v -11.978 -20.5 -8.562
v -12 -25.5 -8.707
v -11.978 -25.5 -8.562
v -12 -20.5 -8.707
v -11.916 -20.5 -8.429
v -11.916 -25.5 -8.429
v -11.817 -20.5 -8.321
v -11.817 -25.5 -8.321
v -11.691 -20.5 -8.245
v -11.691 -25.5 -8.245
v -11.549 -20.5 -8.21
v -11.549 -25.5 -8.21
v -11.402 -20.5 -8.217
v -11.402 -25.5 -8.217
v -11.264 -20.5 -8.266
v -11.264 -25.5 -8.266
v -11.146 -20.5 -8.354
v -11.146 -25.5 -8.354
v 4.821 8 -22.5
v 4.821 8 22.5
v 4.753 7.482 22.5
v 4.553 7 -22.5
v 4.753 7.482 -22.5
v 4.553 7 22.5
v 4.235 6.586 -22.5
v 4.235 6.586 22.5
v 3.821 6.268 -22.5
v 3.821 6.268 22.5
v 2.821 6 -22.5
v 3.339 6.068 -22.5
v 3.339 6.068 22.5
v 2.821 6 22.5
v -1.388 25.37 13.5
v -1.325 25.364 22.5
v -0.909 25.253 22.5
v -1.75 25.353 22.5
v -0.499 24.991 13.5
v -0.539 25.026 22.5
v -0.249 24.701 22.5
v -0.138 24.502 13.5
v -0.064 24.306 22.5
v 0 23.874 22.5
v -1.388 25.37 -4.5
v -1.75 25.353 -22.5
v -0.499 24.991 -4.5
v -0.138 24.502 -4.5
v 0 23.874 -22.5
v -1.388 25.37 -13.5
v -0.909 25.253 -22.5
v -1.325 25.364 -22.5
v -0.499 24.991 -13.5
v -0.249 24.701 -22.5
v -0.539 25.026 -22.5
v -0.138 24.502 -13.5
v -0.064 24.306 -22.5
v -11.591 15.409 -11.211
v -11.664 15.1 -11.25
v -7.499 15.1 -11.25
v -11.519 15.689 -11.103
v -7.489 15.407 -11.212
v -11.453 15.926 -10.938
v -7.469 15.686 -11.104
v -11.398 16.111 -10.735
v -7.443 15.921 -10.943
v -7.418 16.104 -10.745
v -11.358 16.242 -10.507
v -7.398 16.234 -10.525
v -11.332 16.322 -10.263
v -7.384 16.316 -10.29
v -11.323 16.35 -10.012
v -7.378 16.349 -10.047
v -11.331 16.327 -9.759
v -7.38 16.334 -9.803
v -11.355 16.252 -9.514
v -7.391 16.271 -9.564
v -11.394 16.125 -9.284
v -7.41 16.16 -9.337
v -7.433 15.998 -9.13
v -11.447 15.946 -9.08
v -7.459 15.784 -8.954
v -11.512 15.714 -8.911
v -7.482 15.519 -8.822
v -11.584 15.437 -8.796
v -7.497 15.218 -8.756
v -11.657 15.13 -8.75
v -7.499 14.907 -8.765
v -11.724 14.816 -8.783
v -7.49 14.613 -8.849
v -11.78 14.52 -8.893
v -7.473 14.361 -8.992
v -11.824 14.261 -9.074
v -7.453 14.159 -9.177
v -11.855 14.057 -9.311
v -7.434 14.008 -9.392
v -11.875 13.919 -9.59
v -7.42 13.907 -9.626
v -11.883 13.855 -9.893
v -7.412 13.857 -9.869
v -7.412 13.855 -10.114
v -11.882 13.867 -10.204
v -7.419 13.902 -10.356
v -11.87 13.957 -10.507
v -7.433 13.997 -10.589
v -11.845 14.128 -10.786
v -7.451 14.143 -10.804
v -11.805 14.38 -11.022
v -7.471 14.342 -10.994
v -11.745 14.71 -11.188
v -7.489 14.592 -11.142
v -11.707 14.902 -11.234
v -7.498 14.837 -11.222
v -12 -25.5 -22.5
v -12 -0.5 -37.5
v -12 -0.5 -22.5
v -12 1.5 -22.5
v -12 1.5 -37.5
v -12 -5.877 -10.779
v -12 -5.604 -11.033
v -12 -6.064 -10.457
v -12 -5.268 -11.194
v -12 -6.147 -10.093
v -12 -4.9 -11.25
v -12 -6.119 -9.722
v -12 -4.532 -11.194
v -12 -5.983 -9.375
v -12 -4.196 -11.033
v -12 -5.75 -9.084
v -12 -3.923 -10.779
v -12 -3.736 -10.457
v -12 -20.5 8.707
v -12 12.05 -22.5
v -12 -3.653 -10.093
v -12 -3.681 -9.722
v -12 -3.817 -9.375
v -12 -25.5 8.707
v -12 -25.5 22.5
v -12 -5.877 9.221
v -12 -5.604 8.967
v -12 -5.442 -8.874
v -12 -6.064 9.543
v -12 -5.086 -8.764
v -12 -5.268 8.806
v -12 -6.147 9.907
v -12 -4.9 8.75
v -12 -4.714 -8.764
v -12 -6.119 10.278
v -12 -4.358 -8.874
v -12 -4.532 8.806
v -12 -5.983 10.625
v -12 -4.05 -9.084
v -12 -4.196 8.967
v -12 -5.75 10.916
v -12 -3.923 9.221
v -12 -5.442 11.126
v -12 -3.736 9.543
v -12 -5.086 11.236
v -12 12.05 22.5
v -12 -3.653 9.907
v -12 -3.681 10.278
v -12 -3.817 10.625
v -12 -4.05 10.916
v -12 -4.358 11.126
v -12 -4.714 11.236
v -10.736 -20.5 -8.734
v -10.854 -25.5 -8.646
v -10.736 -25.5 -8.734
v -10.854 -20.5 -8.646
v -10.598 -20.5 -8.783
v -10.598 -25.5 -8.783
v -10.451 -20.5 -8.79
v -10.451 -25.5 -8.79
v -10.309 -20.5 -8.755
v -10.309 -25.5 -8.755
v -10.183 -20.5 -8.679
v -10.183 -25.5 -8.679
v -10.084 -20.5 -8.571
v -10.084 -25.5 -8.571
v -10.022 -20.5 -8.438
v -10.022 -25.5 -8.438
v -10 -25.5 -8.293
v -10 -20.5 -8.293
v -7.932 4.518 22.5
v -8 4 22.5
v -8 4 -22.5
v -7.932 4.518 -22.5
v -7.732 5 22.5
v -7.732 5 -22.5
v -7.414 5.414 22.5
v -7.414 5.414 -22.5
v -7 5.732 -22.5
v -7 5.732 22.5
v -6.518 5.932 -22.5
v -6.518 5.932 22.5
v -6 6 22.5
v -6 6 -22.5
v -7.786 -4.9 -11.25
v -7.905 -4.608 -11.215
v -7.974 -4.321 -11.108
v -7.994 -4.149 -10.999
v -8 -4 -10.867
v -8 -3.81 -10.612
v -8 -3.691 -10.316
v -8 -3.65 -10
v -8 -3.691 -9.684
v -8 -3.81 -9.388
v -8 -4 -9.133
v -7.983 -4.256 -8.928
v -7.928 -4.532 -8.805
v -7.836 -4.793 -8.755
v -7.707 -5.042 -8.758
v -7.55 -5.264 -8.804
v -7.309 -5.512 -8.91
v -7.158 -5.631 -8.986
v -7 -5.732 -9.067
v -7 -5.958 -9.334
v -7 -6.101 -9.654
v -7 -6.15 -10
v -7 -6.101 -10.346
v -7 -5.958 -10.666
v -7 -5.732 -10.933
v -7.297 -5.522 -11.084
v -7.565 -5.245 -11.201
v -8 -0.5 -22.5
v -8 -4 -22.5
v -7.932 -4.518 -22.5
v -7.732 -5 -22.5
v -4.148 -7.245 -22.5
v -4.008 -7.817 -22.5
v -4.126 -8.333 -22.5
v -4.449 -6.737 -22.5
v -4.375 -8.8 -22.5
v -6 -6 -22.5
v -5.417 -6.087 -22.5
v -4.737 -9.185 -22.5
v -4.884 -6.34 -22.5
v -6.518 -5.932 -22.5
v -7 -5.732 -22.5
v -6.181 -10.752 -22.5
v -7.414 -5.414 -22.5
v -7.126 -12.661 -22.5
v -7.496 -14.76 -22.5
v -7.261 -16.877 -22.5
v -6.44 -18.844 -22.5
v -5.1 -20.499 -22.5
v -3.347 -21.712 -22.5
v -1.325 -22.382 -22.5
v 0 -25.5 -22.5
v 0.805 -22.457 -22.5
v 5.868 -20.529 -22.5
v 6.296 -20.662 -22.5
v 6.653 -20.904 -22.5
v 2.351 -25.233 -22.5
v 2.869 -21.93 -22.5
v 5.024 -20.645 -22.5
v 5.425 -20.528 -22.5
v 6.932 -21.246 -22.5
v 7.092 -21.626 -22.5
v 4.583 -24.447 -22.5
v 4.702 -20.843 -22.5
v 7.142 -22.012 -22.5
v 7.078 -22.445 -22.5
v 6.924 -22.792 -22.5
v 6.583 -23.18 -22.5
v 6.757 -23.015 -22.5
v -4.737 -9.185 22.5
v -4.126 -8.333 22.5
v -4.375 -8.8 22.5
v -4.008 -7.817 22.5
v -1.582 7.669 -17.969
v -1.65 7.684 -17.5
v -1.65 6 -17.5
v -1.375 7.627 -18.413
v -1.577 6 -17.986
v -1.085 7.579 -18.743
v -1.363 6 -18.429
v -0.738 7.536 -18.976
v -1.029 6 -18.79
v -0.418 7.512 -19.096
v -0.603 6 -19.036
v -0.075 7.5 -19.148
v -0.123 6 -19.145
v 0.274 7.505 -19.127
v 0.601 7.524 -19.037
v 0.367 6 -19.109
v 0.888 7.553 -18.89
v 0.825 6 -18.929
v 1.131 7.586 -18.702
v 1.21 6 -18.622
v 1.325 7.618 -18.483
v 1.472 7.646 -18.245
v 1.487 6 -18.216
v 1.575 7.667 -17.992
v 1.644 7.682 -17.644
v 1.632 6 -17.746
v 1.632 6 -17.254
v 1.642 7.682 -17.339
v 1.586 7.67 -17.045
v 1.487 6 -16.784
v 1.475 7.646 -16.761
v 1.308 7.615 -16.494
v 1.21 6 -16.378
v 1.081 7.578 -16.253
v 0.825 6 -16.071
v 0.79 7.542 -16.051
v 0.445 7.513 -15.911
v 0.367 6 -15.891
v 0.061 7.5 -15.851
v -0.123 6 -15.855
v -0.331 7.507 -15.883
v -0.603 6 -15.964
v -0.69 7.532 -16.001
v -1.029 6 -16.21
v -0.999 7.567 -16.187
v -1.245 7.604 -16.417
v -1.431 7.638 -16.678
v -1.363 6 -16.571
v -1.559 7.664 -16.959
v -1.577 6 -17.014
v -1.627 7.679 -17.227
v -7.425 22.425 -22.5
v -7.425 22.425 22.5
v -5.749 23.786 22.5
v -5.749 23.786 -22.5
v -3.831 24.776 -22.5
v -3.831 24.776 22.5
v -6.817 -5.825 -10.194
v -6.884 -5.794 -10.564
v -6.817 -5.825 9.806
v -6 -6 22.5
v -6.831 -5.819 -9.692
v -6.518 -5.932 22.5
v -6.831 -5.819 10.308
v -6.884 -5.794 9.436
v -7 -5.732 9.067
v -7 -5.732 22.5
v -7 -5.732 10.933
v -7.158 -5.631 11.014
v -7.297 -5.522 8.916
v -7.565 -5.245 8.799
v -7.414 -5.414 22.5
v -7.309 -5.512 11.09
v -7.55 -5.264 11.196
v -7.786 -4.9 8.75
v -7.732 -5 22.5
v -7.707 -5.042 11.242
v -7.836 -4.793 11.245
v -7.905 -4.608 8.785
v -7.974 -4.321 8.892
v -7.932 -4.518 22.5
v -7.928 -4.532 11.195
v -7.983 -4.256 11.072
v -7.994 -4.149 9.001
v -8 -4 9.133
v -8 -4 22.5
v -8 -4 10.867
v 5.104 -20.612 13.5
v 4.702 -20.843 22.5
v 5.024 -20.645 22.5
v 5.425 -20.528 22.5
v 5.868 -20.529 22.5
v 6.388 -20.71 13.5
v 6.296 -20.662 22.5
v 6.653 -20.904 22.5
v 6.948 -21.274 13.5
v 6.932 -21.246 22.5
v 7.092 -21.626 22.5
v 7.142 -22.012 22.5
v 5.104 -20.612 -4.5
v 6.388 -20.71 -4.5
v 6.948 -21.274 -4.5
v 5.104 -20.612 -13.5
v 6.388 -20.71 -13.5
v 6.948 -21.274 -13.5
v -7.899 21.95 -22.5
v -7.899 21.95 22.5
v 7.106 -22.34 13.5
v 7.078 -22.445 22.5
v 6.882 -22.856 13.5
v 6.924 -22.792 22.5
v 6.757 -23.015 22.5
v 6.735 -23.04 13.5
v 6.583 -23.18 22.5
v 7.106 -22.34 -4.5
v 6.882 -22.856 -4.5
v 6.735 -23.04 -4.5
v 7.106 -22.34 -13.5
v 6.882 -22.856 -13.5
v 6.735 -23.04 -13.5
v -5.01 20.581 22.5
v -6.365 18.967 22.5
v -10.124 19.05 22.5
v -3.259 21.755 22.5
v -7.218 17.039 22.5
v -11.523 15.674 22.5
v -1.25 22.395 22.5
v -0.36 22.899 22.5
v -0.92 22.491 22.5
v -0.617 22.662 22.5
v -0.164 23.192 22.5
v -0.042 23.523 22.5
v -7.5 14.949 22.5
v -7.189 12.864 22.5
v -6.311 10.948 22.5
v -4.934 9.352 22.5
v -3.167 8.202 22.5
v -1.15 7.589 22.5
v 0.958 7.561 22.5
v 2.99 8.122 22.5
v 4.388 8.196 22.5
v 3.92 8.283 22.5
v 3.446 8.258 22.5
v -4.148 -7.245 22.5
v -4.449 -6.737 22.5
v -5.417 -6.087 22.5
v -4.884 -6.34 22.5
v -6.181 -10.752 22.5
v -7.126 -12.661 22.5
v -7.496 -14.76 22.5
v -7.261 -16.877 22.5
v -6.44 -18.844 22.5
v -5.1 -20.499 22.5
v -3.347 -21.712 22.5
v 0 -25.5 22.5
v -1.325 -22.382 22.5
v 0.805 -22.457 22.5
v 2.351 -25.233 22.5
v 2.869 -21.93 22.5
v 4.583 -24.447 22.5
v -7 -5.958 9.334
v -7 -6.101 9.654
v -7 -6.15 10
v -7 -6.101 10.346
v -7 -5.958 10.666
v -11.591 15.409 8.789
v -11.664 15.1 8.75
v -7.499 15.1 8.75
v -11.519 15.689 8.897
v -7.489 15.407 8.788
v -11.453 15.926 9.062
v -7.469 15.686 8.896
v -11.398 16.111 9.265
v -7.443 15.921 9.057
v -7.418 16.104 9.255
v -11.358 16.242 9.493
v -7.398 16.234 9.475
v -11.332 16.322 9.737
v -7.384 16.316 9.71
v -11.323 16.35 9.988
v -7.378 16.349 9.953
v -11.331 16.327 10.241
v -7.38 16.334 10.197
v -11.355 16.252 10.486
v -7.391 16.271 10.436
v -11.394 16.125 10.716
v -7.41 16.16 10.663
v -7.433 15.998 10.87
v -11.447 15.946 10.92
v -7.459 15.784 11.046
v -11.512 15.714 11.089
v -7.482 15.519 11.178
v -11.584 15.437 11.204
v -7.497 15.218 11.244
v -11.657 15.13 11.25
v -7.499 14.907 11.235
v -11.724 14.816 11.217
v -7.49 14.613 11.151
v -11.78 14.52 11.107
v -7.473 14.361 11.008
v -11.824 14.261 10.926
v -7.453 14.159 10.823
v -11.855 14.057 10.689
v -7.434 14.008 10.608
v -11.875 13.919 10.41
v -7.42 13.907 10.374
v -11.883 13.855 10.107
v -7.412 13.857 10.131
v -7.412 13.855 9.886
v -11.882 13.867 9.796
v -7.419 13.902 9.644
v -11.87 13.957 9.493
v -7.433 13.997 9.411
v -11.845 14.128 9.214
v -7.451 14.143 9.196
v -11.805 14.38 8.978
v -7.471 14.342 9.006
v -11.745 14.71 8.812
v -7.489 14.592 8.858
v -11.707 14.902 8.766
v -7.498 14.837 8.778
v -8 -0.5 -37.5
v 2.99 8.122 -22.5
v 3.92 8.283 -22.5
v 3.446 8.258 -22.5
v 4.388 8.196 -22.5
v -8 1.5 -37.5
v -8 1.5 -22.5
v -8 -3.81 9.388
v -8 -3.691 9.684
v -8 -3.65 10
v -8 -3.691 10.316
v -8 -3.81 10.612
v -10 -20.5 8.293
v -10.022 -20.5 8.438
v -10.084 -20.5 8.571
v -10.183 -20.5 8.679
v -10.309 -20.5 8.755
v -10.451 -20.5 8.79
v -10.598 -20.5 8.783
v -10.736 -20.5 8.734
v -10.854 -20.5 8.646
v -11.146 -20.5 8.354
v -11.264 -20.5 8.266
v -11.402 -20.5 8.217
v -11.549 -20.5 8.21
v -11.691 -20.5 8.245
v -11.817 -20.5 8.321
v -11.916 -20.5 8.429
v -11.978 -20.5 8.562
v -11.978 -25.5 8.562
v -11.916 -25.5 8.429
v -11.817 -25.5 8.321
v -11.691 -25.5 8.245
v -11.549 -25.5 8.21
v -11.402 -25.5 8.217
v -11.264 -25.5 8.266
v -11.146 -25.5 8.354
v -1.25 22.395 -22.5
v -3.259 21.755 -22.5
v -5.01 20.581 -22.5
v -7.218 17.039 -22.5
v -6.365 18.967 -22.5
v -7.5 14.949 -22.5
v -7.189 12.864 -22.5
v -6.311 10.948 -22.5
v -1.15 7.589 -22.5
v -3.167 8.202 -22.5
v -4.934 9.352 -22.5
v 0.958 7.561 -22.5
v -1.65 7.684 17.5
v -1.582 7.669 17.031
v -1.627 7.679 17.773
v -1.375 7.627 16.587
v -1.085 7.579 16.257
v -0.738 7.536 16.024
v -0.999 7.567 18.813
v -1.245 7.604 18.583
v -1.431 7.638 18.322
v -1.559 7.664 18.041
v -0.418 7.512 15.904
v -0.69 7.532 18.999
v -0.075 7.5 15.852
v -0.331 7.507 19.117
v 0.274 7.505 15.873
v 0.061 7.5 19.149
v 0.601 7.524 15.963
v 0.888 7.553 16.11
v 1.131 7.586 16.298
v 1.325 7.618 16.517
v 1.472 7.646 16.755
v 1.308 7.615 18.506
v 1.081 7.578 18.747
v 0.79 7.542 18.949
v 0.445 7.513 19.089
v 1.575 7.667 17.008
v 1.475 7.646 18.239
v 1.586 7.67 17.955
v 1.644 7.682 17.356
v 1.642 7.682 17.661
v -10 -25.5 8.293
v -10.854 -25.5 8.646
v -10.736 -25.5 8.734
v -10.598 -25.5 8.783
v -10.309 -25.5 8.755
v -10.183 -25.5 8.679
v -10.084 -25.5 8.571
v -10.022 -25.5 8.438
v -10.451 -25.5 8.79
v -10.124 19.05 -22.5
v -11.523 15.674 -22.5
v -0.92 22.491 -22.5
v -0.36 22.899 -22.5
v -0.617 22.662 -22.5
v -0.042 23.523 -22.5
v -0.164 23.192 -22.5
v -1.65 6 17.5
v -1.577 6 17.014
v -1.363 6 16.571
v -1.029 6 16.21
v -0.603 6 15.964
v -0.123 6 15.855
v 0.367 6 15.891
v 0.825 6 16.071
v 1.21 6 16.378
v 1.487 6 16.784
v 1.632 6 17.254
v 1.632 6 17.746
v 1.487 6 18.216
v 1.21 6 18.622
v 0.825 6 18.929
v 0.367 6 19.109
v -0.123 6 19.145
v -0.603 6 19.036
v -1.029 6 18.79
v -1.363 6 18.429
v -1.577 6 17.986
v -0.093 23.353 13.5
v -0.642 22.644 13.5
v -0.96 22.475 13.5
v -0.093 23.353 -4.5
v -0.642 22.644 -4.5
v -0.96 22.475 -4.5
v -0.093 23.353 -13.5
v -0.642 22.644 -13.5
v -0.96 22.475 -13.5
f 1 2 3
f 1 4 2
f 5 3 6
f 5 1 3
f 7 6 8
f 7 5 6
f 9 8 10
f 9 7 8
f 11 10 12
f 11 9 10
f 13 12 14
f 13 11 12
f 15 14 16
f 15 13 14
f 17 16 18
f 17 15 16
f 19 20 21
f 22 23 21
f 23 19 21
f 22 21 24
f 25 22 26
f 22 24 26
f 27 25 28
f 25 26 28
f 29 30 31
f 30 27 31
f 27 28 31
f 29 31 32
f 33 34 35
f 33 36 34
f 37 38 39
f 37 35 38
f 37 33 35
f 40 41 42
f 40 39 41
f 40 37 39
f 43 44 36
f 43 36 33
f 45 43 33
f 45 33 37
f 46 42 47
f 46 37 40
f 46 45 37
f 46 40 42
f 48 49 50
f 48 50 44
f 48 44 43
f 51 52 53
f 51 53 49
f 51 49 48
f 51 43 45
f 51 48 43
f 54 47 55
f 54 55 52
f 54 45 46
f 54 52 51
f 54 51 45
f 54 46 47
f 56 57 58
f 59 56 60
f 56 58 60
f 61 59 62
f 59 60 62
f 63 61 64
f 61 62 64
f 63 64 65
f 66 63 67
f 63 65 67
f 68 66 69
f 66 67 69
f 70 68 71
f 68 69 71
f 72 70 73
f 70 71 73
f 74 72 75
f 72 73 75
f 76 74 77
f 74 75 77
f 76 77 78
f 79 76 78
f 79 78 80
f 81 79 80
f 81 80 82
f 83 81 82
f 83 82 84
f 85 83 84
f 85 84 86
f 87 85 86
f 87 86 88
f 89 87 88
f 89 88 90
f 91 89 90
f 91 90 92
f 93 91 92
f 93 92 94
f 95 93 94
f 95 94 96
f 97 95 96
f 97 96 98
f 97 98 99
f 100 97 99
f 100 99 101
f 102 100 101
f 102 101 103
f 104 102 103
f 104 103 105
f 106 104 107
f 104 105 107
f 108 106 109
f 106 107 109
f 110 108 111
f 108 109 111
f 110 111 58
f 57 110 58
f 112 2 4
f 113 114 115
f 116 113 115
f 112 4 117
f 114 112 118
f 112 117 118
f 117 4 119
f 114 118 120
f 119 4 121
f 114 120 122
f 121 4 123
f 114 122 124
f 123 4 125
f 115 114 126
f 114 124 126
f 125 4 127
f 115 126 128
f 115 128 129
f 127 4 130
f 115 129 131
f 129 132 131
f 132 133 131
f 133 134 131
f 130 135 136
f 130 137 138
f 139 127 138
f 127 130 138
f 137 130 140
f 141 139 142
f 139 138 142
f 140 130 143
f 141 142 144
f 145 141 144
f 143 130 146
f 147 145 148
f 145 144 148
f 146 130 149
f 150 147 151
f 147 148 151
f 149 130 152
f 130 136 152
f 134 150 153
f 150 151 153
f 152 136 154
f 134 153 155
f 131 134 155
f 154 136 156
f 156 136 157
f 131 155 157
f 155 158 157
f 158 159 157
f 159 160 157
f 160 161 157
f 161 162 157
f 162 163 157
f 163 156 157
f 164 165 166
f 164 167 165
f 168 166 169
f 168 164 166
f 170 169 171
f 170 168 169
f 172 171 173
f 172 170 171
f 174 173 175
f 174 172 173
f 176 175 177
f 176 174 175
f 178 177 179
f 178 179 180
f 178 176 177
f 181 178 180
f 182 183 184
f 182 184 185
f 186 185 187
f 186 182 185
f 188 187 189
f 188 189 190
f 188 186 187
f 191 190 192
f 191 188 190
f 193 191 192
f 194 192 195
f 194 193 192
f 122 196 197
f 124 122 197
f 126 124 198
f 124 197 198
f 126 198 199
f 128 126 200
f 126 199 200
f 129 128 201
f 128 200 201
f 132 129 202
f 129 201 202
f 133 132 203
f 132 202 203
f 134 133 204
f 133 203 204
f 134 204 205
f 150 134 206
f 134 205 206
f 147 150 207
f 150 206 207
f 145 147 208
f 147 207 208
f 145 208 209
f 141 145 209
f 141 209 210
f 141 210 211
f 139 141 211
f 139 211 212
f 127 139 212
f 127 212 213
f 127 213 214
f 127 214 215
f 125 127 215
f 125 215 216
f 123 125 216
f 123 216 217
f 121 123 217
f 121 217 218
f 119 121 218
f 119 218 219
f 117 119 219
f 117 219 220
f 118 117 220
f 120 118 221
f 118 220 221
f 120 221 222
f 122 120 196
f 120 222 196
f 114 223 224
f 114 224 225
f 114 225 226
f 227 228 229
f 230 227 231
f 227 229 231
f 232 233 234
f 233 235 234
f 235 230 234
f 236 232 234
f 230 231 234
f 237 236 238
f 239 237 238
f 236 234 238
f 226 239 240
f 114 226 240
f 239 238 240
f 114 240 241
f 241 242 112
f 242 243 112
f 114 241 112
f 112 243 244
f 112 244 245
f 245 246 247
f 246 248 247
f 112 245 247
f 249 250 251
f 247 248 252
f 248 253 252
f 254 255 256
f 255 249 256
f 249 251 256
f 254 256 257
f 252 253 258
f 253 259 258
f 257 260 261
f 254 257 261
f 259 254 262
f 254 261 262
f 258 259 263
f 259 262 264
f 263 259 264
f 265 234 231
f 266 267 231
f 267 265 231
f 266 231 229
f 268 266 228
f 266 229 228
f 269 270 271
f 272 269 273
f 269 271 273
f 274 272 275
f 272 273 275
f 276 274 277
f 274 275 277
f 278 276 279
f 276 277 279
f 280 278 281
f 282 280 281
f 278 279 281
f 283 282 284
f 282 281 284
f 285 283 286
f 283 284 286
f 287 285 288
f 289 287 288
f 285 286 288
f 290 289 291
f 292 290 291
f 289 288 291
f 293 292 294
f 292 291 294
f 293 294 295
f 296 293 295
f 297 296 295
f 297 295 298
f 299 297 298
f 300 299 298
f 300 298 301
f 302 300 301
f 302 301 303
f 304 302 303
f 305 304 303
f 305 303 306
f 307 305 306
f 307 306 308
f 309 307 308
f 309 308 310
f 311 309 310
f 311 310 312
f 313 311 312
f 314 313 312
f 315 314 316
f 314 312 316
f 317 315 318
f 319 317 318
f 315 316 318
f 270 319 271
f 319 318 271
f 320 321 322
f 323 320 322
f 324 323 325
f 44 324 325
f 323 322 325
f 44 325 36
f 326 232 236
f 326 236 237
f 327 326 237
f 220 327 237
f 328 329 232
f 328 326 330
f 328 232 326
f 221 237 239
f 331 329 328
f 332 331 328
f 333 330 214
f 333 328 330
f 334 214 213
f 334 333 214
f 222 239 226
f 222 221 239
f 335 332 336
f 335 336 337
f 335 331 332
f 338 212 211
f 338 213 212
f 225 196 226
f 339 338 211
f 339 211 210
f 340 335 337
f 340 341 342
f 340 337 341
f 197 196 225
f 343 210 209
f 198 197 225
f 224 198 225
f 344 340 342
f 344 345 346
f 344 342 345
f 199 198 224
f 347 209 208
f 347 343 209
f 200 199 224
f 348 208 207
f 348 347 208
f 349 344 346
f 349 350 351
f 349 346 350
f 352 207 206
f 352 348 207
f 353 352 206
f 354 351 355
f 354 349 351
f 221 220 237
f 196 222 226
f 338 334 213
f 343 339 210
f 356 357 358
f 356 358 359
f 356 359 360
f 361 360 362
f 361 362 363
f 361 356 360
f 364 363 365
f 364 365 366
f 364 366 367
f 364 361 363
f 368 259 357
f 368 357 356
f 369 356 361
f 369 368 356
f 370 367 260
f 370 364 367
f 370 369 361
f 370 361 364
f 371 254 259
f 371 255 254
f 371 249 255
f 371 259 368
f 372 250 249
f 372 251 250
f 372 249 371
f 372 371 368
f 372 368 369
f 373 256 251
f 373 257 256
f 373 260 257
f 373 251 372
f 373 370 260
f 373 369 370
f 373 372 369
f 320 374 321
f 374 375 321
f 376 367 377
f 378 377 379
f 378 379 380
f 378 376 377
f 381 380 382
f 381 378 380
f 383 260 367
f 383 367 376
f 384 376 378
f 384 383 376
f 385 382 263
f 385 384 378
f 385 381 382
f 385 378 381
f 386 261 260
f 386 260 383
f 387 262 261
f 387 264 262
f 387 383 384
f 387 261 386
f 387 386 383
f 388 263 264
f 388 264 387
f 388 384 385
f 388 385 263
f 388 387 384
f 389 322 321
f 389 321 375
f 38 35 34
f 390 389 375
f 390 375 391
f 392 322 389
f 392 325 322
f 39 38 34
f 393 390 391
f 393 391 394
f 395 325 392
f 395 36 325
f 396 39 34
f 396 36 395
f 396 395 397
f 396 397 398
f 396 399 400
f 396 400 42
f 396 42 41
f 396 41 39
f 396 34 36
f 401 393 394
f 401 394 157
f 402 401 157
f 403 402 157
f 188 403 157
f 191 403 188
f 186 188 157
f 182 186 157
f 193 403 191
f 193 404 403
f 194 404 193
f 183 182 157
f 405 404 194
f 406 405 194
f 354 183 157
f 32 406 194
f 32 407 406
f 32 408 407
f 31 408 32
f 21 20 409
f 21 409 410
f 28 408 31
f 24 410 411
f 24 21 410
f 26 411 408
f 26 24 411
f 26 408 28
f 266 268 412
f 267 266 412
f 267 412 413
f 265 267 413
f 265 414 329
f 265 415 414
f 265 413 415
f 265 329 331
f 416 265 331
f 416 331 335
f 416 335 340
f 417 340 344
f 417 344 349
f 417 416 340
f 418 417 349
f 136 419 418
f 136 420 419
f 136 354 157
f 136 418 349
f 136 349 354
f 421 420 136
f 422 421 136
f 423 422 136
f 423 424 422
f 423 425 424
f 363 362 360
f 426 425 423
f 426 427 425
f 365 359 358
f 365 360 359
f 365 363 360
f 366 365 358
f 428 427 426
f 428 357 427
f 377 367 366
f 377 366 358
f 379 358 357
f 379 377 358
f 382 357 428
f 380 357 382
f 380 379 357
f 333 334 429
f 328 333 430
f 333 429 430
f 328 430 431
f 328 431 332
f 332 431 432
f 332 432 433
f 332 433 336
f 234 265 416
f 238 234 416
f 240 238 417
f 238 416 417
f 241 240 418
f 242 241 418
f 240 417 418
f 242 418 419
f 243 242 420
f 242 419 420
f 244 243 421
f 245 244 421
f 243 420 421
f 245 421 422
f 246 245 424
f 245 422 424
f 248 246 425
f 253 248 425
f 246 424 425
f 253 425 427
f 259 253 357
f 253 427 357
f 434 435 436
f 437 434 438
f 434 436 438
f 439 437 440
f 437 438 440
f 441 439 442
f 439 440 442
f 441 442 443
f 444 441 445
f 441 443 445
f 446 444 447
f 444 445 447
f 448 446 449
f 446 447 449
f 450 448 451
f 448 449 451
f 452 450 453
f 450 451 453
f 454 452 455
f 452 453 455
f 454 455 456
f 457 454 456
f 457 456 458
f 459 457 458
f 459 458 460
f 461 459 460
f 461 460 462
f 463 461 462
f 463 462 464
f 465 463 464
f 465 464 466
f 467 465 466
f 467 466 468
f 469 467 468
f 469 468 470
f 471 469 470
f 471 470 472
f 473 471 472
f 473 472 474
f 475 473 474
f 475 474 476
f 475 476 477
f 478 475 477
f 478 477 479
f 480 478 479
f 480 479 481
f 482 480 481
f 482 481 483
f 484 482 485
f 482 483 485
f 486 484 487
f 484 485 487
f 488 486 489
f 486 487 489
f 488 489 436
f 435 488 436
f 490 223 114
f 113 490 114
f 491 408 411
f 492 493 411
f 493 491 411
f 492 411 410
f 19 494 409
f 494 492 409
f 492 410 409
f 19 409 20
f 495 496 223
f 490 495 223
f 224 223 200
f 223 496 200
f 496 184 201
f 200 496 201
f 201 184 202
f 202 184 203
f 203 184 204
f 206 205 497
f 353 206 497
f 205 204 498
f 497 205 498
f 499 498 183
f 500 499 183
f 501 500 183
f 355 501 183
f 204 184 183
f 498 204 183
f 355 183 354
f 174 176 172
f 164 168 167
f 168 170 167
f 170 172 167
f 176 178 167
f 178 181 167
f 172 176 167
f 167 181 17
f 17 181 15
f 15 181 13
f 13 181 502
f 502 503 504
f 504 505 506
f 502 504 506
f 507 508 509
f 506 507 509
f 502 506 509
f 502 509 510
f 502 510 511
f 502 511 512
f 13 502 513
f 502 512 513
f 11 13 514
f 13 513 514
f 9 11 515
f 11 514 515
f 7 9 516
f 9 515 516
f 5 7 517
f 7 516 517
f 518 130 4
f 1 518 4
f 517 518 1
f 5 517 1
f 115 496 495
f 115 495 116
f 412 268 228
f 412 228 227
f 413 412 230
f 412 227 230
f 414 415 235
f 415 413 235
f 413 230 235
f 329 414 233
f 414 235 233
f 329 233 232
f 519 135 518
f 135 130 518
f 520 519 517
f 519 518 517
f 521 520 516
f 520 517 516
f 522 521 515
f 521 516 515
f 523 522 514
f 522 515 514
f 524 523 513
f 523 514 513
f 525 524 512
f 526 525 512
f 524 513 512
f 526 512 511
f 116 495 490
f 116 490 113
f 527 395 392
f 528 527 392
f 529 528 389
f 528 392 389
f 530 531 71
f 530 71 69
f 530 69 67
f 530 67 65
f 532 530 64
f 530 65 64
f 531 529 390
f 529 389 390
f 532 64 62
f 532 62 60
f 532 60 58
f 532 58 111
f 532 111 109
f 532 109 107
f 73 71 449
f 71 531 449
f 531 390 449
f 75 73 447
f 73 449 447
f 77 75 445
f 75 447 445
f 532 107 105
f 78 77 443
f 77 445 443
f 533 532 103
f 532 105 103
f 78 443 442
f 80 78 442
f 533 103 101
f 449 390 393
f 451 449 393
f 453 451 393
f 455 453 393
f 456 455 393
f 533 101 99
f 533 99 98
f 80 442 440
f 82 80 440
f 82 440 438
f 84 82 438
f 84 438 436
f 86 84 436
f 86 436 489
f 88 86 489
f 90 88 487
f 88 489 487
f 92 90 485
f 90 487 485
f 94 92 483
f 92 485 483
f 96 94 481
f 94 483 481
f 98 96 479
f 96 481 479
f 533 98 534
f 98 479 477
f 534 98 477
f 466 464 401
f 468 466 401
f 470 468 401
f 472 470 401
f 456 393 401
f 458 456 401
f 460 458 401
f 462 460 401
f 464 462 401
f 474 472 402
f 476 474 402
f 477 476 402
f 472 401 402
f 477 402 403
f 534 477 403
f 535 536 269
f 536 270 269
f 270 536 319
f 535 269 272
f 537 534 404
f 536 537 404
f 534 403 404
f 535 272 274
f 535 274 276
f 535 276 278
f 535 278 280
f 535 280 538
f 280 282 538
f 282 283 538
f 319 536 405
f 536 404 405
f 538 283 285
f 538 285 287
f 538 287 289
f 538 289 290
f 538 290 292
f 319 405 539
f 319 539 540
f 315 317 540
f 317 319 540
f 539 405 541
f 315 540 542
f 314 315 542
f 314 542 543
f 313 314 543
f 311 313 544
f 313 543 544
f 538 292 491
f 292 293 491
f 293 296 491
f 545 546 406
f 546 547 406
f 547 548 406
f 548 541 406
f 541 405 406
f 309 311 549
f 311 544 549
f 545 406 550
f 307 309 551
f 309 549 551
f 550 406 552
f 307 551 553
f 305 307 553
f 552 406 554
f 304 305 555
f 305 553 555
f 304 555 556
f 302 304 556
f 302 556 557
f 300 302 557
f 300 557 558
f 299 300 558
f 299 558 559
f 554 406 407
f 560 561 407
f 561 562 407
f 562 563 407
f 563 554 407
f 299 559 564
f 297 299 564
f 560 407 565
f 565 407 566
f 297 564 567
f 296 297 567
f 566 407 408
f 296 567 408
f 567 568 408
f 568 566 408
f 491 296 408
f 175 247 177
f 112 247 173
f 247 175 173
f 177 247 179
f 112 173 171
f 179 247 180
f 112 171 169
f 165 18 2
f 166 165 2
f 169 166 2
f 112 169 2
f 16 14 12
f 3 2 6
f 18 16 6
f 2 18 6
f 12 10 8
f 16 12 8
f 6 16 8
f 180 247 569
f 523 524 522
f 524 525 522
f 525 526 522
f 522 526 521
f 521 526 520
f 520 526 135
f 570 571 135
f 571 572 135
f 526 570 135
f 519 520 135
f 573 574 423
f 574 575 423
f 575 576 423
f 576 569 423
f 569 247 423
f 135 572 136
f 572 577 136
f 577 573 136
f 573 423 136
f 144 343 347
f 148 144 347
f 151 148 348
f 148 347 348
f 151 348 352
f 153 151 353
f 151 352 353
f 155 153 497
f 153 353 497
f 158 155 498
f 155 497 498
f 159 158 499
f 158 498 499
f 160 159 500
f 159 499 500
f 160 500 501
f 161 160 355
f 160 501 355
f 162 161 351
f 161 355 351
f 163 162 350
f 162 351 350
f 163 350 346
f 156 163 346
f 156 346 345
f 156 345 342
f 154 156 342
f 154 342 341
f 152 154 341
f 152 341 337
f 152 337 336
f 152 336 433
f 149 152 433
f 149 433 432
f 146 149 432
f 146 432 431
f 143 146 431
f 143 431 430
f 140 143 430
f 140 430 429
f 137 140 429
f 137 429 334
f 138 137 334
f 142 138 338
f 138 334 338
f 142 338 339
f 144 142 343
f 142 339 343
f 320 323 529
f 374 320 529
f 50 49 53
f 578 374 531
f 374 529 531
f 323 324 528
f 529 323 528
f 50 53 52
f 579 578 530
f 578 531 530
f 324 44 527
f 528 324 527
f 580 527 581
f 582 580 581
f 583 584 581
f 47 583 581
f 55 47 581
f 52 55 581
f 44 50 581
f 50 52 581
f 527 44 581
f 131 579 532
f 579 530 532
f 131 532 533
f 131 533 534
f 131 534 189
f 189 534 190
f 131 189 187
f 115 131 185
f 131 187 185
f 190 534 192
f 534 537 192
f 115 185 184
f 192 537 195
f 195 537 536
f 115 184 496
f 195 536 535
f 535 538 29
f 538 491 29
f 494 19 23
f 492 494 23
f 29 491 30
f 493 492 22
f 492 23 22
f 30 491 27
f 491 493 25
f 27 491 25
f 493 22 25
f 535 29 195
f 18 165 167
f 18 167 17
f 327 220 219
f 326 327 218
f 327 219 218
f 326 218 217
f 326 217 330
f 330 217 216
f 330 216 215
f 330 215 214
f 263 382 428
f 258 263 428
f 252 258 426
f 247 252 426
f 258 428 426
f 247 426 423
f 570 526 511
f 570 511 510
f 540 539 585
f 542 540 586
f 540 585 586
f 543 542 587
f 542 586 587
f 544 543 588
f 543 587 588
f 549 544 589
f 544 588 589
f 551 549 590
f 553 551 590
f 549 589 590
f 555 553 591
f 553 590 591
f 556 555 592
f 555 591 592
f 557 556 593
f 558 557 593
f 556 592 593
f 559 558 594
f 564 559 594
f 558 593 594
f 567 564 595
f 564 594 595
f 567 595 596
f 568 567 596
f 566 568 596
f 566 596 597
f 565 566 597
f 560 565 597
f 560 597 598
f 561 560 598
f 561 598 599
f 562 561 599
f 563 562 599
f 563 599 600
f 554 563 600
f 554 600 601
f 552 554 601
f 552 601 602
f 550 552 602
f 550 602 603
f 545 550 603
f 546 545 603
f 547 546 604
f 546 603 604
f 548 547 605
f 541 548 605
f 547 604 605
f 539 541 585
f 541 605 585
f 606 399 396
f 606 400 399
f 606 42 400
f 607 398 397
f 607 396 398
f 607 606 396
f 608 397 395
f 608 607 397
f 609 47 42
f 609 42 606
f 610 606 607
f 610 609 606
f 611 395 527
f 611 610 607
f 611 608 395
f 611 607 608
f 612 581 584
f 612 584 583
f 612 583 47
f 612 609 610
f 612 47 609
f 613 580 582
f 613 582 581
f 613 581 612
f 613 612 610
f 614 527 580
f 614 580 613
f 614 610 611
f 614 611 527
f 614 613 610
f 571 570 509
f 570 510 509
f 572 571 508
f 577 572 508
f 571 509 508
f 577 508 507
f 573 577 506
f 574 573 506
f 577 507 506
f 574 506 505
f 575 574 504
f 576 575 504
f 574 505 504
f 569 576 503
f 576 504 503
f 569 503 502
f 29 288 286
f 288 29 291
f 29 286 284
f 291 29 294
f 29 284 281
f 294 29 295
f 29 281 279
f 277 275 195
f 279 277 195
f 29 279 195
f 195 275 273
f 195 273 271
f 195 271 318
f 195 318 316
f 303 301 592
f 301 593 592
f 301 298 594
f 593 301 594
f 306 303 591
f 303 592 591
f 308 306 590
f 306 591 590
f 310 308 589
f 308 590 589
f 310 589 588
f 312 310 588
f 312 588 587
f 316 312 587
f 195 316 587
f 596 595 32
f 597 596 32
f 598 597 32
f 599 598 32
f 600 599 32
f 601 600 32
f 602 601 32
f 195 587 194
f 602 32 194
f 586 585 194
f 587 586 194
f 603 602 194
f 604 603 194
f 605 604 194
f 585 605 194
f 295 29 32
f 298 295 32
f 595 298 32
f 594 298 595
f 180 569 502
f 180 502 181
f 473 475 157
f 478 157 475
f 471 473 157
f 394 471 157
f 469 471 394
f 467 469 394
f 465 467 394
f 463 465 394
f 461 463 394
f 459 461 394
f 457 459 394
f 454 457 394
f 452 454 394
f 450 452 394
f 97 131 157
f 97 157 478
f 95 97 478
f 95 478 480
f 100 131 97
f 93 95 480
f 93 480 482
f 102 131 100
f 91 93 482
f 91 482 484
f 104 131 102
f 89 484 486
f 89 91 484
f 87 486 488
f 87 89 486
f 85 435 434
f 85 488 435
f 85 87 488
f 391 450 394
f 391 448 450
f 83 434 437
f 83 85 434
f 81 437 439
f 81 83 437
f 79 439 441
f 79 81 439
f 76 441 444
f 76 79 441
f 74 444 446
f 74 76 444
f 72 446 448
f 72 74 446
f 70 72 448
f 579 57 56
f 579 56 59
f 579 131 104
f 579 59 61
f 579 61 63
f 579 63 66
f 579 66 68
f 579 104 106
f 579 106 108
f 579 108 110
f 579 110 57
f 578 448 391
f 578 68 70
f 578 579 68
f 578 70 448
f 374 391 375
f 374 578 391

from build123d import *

# Parameters (mm, degrees)
BOSS_EXTRUDE1_DEPTH        = 22.5
M4X0_7_TAPPED_HOLE2_REACH  = 42.528
M4X0_7_TAPPED_HOLE2_BORE_R = 1.65
FILLET2_R                  = 2
FILLET3_START              = -23
FILLET3_DEPTH              = 46
FILLET4_START              = -22.5
FILLET4_DEPTH              = 45
FILLET5_R                  = 2
FILLET7_R                  = 14
CUT_EXTRUDE5_DEPTH         = 5
FILLET8_R                  = 0.5
M3X0_5_TAPPED_HOLE1_D      = 2.5
M3X0_5_TAPPED_HOLE1_DEPTH  = 5
M3X0_5_TAPPED_HOLE1_TIP    = 0.751075774
SKETCH20_W                 = 4
SKETCH20_H                 = 2
BOSS_EXTRUDE3_DEPTH        = 15


with BuildPart() as part:
    # Sketch1 → Boss-Extrude1 (new, symmetric)
    with BuildSketch(Plane.XY):
        with BuildLine():
            Line((7.142207986, -17.288856719), (7.142207986, -22.696678834))
            ThreePointArc((7.142207986, -22.696678834), (3.836331075, -24.774076114), (0, -25.5))
            Line((0, -25.5), (-12, -25.5))
            Line((-12, -25.5), (-12, 17.849242405))
            Line((-12, 17.849242405), (-7.424621202, 22.424621202))
            ThreePointArc((-7.424621202, 22.424621202), (-4.01817604, 24.700735091), (0, 25.5))
            Line((0, 25.5), (0, 22.5))
            ThreePointArc((0, 22.5), (-7.047694656, 12.434848925), (4.820907073, 9.254666677))
            Line((4.820907073, 9.254666677), (4.820907073, 6))
            Line((4.820907073, 6), (-8, 6))
            Line((-8, 6), (-8, -6))
            Line((-8, -6), (-4, -6))
            Line((-4, -6), (-4, -8.65571123))
            ThreePointArc((-4, -8.65571123), (-4.593600768, -20.928645038), (7.142207986, -17.288856719))
        make_face()
    extrude(amount=BOSS_EXTRUDE1_DEPTH, both=True)

    # M4x0.7 Tapped Hole2 bore → M4x0.7 Tapped Hole2 (cut, up to next)
    with BuildSketch(Plane(origin=(0, 6, 0), x_dir=(-1, 0, 0), z_dir=(0, -1, 0)), mode=Mode.PRIVATE) as m4x0_7_tapped_hole2_sk1:
        with Locations((0, -17.5)):
            Circle(M4X0_7_TAPPED_HOLE2_BORE_R)
    m4x0_7_tapped_hole2_tool1 = extrude(m4x0_7_tapped_hole2_sk1.sketch, amount=-M4X0_7_TAPPED_HOLE2_REACH, mode=Mode.PRIVATE) & part.part
    # M4x0.7 Tapped Hole2 bore → M4x0.7 Tapped Hole2 (cut, up to next)
    with BuildSketch(Plane(origin=(0, 6, 0), x_dir=(-1, 0, 0), z_dir=(0, -1, 0)), mode=Mode.PRIVATE) as m4x0_7_tapped_hole2_sk2:
        with Locations((0, 17.5)):
            Circle(M4X0_7_TAPPED_HOLE2_BORE_R)
    m4x0_7_tapped_hole2_tool2 = extrude(m4x0_7_tapped_hole2_sk2.sketch, amount=-M4X0_7_TAPPED_HOLE2_REACH, mode=Mode.PRIVATE) & part.part
    add(m4x0_7_tapped_hole2_tool1.solids().sort_by_distance((0, 6, 17.5))[0], mode=Mode.SUBTRACT)
    add(m4x0_7_tapped_hole2_tool2.solids().sort_by_distance((0, 6, -17.5))[0], mode=Mode.SUBTRACT)

    # Fillet2
    # the kernel refuses this fillet: 2 mm, written as the material it adds along each edge
    with BuildSketch(Plane(origin=(-8, -6, 22.5), x_dir=(0, 1, 0), z_dir=(0, 0, -1)), Plane(origin=(-8, 6, 22.5), x_dir=(1, 0, 0), z_dir=(0, 0, -1))) as fillet2_piece_1:
        with BuildLine():
            CenterArc((FILLET2_R, FILLET2_R), FILLET2_R, 180, 90)
            Line((0, FILLET2_R), (0, 0))
            Line((0, 0), (FILLET2_R, 0))
        make_face()
    extrude(amount=45)
    # the kernel refuses this fillet: 2 mm, written as the material it takes off along each edge
    with BuildSketch(Plane(origin=(-4, -8.65571123, -25.052927903), x_dir=(-0.8120954257724025, -0.5835246519552882, 0), z_dir=(0, 0, 1))) as fillet2_2_piece_1:
        with BuildLine():
            CenterArc((1.028312305, -1.996337733), FILLET2_R, 93.46787904, 50.833289284)
            Line((-0.595878546, -0.829288429), (0, 0))
            ThreePointArc((0, 0), (0.453667193, -0.013733502), (0.907334387, 0))
        make_face()
    extrude(amount=50.105855806, mode=Mode.SUBTRACT)
    with BuildSketch(Plane(origin=(-4, -6, -27.5), x_dir=(0, -1, 0), z_dir=(0, 0, 1)), Plane(origin=(4.820907073, 6, 27.5), x_dir=(0, 1, 0), z_dir=(0, 0, -1))) as fillet2_2_piece_2:
        with BuildLine():
            CenterArc((FILLET2_R, -FILLET2_R), FILLET2_R, 90, 90)
            Line((0, -FILLET2_R), (0, 0))
            Line((0, 0), (FILLET2_R, 0))
        make_face()
    extrude(amount=55, mode=Mode.SUBTRACT)

    # Fillet3: read off the stored shape, not the designer's step
    # Fillet3 outline → Fillet3 (cut)
    with BuildSketch(Plane.XY.offset(FILLET3_START)):
        with BuildLine():
            ThreePointArc((0, 25.5), (-0.878075733, 25.463220489), (-1.75, 25.35313962))
            add(Edge.make_bspline(
                [(-1.75, 25.35313962), (-1.340626415, 25.422336386), (-0.839763435, 25.364052085), (-0.332775331, 25.08288536), (1e-09, 24.544131647), (0, 23.874119673)],
                knots=[0, 0, 0, 0, 0, 0, 0.541960109, 0.541960109, 0.541960109, 0.541960109, 0.541960109, 0.541960109], degree=5, weights=[1, 0.783215957, 0.625176065, 0.525880325, 0.485328737, 0.503521301]))
            Line((0, 23.874119673), (0, 25.5))
        make_face()
        with BuildLine():
            Line((0, 22.5), (0, 23.874119673))
            add(Edge.make_bspline(
                [(0, 23.874119673), (-1e-09, 23.344488498), (-0.216926345, 22.902050344), (-0.555121167, 22.607049118), (-0.918235372, 22.451178186), (-1.25, 22.395099729)],
                knots=[0.541960109, 0.541960109, 0.541960109, 0.541960109, 0.541960109, 0.541960109, 1, 1, 1, 1, 1, 1], degree=5, weights=[0.503521301, 0.518896824, 0.576232456, 0.675528195, 0.816784043, 1]))
            ThreePointArc((-1.25, 22.395099729), (-0.627196952, 22.473728921), (0, 22.5))
        make_face()
    extrude(amount=FILLET3_DEPTH, mode=Mode.SUBTRACT)

    # Fillet4: read off the stored shape, not the designer's step
    # Fillet4 outline → Fillet4 (cut)
    with BuildSketch(Plane.XY.offset(FILLET4_START)):
        with BuildLine():
            ThreePointArc((7.142207986, -17.288856719), (6.182933262, -19.245154446), (4.701839989, -20.843175568))
            add(Edge.make_bspline(
                [(4.701839989, -20.843175568), (5.135113998, -20.494532089), (5.812281829, -20.26945545), (6.615008937, -20.444697489), (7.14219213, -21.142606567), (7.142207986, -22.011783319)],
                knots=[0, 0, 0, 0, 0, 0, 0.676183816, 0.676183816, 0.676183816, 0.676183816, 0.676183816, 0.676183816], degree=5, weights=[1, 0.729526474, 0.550497858, 0.462914153, 0.466775358, 0.562081474]))
            Line((7.142207986, -22.011783319), (7.142207986, -17.288856719))
        make_face()
        with BuildLine():
            Line((7.142207986, -22.696678834), (7.142207986, -22.011783319))
            add(Edge.make_bspline(
                [(7.142207986, -22.011783319), (7.142213818, -22.331484727), (7.059225631, -22.61727017), (6.921863818, -22.854436912), (6.756468906, -23.040519024), (6.582575984, -23.180445796)],
                knots=[0.676183816, 0.676183816, 0.676183816, 0.676183816, 0.676183816, 0.676183816, 1, 1, 1, 1, 1, 1], degree=5, weights=[0.562081474, 0.607722411, 0.674334732, 0.761918437, 0.870473526, 1]))
            ThreePointArc((6.582575984, -23.180445796), (6.866653579, -22.943492218), (7.142207986, -22.696678834))
        make_face()
    extrude(amount=FILLET4_DEPTH, mode=Mode.SUBTRACT)

    # Fillet5
    # the kernel refuses this fillet: 2 mm, written as the material it takes off along each edge
    with BuildSketch(Plane(origin=(4.820907073, 9.254666677, 27.882265511), x_dir=(-0.8503705465795661, -0.5261843151500908, 0), z_dir=(0, 0, -1))) as fillet5_piece_1:
        with BuildLine():
            CenterArc((2.439960365, -1.97929278), FILLET5_R, 98.251994966, 54.607083408)
            Line((0.660185926, -1.066931588), (0.624590437, -1.048684364))
            ThreePointArc((0.624590437, -1.048684364), (0.296078141, -0.554513166), (-0.034014822, -0.021047373))
            Line((-0.034014822, -0.021047373), (0.005741083, 0.039585856))
            ThreePointArc((0.005741083, 0.039585856), (1.076453102, -0.037652075), (2.147165121, 0.039585856))
            Line((2.147165121, 0.039585856), (2.152906205, 0))
        make_face()
    extrude(amount=55.764531023, mode=Mode.SUBTRACT)

    # Fillet7
    fillet7_edges = [part.edges().sort_by_distance(p)[0] for p in [
        (-12, 17.849242405, 0),
    ]]
    fillet(fillet7_edges, radius=FILLET7_R)

    # Sketch17 → Cut-Extrude5 (cut)
    with BuildSketch(Plane.XZ.offset(25.5)):
        Polygon((-12, 7.5), (-10, 9.5), (-10, -9.5), (-12, -7.5), align=None)
    extrude(amount=-CUT_EXTRUDE5_DEPTH, mode=Mode.SUBTRACT)

    # Fillet8
    fillet8_edges = [part.edges().sort_by_distance(p)[0] for p in [
        (-12, -23, -7.5),
        (-12, -23, 7.5),
        (-10, -23, 9.5),
        (-10, -23, -9.5),
    ]]
    fillet(fillet8_edges, radius=FILLET8_R)

    # M3x0.5 Tapped Hole1
    with Locations(Plane.ZY.offset(12)):
        with Locations((-10, 15.1), (-10, -4.9), (10, -4.9), (10, 15.1)):
            Hole(M3X0_5_TAPPED_HOLE1_D / 2, depth=M3X0_5_TAPPED_HOLE1_DEPTH)
            with Locations((0, 0, -(M3X0_5_TAPPED_HOLE1_DEPTH + M3X0_5_TAPPED_HOLE1_TIP / 2))):  # 118° drill point
                Cone(0, M3X0_5_TAPPED_HOLE1_D / 2, M3X0_5_TAPPED_HOLE1_TIP, mode=Mode.SUBTRACT)

    # Sketch20 → Boss-Extrude3 (add)
    with BuildSketch(Plane(origin=(0, 0, -22.5), x_dir=(-1, 0, 0), z_dir=(0, 0, -1))):
        with Locations((10, 0.5)):
            Rectangle(SKETCH20_W, SKETCH20_H)
    extrude(amount=BOSS_EXTRUDE3_DEPTH)


solid = part.part
